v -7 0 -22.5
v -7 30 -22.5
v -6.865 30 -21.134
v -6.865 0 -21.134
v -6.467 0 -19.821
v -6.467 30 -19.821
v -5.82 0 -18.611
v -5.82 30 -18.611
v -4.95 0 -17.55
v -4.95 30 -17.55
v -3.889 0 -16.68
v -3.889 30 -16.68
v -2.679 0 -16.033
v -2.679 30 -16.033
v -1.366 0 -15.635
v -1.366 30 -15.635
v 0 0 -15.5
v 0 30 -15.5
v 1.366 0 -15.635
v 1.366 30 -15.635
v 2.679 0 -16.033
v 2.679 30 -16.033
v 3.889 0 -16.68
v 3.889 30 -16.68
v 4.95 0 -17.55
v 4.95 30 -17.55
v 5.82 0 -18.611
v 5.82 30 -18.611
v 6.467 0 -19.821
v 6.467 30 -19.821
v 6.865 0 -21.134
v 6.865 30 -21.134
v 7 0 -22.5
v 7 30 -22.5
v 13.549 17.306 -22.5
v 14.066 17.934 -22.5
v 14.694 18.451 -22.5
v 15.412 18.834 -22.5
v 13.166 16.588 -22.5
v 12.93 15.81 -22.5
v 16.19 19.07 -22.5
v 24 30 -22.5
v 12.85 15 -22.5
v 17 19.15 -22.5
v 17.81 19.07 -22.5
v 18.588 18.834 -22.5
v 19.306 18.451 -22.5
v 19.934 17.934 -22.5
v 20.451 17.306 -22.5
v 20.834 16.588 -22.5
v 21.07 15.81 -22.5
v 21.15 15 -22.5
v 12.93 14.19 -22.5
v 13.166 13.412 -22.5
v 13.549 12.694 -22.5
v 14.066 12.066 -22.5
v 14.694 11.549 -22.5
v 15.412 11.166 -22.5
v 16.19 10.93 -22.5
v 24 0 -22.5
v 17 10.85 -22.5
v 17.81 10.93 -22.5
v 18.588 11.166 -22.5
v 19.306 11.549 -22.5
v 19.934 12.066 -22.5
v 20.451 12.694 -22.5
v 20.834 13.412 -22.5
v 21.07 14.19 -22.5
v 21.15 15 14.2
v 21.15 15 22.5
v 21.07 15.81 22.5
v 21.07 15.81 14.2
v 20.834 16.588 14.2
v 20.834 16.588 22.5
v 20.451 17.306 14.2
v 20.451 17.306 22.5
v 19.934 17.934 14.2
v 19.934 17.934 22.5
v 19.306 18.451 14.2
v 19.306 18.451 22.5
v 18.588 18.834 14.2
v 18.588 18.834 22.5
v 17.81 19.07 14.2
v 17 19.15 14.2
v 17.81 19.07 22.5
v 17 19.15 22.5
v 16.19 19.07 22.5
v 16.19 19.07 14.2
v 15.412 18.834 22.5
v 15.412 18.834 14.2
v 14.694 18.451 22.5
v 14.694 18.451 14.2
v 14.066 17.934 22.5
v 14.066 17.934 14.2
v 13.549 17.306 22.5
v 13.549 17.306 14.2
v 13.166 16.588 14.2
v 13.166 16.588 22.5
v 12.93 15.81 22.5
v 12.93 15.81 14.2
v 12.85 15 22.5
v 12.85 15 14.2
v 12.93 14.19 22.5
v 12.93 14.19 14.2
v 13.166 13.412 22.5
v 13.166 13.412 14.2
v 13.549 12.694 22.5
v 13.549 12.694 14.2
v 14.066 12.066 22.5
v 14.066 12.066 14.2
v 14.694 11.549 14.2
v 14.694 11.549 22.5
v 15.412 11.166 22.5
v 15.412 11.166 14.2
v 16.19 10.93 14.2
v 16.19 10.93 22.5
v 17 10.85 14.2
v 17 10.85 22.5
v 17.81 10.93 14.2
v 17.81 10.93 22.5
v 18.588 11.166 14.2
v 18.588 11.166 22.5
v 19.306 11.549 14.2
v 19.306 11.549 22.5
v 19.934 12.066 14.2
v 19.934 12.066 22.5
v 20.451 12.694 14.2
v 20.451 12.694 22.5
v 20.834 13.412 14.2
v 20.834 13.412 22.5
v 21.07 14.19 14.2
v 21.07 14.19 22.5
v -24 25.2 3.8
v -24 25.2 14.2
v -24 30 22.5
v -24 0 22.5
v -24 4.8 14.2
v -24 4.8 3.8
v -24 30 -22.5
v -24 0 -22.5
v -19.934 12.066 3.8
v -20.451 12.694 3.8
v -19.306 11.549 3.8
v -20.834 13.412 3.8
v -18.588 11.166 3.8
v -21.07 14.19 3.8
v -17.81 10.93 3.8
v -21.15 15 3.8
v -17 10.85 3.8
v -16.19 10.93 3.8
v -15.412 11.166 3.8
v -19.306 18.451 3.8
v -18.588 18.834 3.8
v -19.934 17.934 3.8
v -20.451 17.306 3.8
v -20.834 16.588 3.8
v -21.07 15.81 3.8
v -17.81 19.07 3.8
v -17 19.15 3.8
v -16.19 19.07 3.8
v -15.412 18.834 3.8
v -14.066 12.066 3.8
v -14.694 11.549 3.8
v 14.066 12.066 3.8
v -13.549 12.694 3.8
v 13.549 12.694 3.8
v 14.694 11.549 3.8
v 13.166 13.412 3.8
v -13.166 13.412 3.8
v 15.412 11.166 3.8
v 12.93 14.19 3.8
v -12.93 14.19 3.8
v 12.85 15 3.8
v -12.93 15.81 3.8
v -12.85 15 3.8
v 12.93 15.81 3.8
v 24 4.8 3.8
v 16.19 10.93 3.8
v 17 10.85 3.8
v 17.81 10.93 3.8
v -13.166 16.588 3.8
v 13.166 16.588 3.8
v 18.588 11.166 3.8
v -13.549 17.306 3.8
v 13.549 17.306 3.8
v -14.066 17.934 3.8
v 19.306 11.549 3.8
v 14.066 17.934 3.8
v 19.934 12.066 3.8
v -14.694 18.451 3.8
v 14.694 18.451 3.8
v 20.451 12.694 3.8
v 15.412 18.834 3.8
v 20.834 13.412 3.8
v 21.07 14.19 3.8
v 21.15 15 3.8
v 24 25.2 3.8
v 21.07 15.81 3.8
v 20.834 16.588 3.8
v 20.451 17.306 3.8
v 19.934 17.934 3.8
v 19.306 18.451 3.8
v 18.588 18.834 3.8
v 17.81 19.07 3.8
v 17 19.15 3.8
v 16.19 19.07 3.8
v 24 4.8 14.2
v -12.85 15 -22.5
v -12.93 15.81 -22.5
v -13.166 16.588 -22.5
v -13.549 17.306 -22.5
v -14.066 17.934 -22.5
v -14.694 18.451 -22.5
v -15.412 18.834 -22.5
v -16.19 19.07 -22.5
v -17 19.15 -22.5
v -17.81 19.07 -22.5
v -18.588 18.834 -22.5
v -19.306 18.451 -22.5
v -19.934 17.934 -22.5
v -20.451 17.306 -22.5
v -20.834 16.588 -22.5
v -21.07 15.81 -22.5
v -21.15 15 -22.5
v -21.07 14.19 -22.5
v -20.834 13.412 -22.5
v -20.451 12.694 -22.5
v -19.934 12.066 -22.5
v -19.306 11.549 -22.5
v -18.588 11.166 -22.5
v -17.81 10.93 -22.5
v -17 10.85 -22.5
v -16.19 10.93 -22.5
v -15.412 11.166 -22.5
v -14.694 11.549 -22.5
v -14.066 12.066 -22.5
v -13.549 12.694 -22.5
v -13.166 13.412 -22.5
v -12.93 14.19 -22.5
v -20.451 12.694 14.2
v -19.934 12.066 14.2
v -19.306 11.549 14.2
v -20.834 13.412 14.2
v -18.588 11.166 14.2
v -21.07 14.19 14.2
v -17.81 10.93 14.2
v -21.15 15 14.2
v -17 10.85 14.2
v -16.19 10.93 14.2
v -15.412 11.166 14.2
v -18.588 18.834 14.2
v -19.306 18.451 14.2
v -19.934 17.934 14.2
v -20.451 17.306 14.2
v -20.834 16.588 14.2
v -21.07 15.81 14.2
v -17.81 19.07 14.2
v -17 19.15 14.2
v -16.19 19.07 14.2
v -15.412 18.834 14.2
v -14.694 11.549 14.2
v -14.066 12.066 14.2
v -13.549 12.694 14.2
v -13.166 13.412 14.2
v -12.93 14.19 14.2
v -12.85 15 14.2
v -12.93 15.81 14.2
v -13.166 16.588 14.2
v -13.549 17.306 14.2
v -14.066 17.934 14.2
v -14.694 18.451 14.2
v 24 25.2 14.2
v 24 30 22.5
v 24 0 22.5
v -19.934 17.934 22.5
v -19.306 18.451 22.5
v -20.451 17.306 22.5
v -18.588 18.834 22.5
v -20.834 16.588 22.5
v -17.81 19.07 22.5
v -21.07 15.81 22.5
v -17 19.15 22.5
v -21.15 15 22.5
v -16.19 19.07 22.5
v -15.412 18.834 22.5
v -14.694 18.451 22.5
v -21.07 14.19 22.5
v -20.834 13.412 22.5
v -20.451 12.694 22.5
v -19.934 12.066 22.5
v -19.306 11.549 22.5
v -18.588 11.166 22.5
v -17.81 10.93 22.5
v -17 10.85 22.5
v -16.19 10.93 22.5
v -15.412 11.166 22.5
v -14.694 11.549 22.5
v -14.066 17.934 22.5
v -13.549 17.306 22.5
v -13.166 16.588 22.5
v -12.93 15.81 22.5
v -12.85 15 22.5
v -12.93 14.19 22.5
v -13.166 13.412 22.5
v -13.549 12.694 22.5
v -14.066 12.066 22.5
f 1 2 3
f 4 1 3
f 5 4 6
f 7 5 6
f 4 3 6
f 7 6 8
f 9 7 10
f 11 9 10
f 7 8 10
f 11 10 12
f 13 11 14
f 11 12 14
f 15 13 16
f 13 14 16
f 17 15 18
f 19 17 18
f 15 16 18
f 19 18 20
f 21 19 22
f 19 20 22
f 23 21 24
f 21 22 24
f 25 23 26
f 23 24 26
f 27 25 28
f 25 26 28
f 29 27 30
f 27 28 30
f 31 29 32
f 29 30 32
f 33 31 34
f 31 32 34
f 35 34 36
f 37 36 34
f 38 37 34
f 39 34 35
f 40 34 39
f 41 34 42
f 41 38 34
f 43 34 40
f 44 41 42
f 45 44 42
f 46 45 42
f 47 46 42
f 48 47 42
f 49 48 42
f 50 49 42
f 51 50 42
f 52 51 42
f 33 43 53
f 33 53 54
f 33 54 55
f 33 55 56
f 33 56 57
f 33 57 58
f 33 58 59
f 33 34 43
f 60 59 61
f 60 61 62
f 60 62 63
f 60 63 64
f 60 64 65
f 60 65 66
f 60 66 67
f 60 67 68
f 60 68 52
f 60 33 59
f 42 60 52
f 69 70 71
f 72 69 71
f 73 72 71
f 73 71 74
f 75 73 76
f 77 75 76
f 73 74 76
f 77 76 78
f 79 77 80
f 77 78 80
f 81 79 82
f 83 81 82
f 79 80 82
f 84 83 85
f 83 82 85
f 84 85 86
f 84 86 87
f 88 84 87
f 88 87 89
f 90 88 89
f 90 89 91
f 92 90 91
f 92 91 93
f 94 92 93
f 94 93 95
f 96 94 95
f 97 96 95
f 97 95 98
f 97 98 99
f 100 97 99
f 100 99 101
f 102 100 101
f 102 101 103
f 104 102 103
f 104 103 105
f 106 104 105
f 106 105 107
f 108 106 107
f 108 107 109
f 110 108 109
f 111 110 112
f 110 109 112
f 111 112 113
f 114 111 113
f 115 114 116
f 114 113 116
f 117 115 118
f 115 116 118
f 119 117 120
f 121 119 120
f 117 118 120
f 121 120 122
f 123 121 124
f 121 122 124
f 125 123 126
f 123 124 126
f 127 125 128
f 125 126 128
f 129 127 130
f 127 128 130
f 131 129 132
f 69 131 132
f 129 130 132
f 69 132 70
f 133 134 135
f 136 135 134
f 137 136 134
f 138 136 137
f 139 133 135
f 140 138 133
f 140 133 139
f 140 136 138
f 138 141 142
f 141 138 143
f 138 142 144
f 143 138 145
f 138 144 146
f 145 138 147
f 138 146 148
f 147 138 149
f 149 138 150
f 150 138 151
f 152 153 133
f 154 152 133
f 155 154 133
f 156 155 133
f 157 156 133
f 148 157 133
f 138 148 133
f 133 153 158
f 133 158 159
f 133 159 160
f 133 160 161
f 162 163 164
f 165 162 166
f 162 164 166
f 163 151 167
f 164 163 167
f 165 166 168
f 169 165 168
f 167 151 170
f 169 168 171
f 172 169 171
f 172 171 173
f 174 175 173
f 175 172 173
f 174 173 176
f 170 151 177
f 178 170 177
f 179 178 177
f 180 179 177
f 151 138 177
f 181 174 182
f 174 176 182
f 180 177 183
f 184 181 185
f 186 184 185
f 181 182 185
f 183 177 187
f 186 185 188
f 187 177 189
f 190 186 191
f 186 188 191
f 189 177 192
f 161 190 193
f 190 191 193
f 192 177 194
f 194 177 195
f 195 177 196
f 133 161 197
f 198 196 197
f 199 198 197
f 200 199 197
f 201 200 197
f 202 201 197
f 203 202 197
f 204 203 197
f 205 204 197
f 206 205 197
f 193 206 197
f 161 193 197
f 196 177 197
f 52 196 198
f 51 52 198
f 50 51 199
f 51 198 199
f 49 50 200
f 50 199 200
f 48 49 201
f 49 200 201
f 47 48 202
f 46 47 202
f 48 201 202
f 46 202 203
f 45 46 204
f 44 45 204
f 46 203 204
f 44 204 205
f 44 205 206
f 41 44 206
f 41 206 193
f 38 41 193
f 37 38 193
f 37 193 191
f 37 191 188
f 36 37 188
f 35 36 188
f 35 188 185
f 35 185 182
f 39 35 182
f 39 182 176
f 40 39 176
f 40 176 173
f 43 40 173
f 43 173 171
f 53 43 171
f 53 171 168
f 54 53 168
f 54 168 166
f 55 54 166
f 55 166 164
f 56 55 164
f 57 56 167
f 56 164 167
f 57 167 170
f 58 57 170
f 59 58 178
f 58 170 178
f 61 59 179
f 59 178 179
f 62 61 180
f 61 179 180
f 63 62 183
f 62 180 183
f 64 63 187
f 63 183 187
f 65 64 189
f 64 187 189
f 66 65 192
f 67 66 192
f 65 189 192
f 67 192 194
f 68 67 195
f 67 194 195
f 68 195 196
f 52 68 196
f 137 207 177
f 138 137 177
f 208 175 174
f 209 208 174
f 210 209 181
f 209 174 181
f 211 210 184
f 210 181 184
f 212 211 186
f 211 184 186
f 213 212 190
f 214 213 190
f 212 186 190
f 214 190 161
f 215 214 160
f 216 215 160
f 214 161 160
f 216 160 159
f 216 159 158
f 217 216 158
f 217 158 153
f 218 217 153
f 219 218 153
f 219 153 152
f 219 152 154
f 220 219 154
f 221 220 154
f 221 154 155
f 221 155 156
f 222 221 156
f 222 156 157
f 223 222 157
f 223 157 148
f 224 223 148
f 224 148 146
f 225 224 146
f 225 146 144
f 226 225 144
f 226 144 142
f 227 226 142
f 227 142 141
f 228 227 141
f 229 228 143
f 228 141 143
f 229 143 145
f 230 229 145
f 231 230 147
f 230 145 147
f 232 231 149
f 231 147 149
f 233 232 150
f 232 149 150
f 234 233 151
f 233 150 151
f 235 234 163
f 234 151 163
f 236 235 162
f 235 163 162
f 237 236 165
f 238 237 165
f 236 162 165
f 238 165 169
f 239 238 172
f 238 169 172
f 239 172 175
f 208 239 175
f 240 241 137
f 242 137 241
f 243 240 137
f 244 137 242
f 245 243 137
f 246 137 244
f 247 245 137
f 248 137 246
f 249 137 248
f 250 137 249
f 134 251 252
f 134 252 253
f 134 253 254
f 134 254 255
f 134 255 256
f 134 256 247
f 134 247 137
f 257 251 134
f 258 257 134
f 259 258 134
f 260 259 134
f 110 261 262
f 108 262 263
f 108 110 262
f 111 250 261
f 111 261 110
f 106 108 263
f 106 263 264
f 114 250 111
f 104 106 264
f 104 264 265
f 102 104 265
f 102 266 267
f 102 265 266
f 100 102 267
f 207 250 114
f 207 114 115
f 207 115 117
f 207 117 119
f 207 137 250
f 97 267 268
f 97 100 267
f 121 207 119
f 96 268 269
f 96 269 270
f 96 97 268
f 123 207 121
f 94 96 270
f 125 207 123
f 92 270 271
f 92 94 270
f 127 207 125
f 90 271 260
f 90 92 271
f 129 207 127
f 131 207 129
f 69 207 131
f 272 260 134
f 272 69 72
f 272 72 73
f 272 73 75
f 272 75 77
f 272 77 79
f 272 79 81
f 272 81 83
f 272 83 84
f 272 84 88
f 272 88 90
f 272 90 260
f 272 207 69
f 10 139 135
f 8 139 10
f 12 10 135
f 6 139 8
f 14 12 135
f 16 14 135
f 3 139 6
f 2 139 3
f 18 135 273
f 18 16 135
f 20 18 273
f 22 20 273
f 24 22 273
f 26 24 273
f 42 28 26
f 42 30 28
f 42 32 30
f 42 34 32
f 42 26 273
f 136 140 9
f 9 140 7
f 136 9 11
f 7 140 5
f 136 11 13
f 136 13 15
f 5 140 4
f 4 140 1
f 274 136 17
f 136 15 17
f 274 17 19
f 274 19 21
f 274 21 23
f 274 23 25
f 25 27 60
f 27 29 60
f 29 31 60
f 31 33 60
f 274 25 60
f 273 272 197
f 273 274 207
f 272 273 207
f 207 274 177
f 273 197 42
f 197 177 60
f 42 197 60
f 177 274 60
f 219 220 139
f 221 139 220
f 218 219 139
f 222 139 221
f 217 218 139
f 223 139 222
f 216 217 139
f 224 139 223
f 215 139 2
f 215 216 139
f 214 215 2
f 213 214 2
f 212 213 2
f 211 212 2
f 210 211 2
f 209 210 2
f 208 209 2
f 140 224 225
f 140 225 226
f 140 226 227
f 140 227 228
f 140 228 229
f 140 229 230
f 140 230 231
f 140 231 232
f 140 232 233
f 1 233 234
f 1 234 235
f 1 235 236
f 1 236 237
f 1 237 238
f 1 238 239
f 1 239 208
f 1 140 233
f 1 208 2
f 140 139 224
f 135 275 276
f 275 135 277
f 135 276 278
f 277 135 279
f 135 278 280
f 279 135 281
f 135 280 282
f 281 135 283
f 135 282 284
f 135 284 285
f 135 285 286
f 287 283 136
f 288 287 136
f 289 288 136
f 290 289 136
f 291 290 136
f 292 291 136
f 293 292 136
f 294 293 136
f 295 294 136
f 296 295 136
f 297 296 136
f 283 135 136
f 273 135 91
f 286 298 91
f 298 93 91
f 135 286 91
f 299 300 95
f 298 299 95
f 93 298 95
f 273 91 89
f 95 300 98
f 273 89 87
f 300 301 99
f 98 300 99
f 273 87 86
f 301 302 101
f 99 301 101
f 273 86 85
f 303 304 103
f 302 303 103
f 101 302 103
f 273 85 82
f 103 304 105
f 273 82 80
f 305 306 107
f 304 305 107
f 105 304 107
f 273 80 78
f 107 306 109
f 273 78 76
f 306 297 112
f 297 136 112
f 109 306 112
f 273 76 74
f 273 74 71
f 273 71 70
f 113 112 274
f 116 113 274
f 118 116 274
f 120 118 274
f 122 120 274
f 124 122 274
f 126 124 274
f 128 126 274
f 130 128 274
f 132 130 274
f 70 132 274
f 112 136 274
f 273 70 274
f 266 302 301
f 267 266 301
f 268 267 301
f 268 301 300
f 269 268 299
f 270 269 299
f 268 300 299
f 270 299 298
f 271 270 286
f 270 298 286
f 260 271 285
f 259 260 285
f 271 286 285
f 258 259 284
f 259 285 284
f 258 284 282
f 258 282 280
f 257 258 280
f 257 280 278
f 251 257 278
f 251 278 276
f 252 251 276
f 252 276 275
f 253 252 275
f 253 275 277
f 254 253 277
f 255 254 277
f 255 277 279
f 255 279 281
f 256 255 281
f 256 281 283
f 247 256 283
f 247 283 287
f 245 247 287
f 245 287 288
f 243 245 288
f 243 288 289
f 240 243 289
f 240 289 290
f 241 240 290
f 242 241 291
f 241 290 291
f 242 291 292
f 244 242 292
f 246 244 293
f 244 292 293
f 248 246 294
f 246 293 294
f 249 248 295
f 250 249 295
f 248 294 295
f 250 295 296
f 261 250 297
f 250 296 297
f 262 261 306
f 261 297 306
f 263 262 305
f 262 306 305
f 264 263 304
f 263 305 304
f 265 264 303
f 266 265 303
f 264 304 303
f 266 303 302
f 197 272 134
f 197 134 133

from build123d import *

# Parameters (mm, degrees)
SKETCH1_W               = 48
SKETCH1_H               = 45
BOSS_EXTRUDE1_DEPTH     = 30
SKETCH2_W               = 10.4
SKETCH2_H               = 20.4
CUT_EXTRUDE1_DEPTH      = 49
SKETCH3_R               = 4.15
CUT_EXTRUDE2_DEPTH      = 46
CUT_EXTRUDE3_DEPTH      = 1
CUT_EXTRUDE3_DEPTH_BACK = 31


with BuildPart() as part:
    # Sketch1 → Boss-Extrude1 (new body)
    with BuildSketch(Plane(origin=(0, 0, 0), x_dir=(1, 0, 0), z_dir=(0, 1, 0))):
        Rectangle(SKETCH1_W, SKETCH1_H)
    extrude(amount=BOSS_EXTRUDE1_DEPTH)

    # Sketch2 → Cut-Extrude1 (cut, through all)
    with BuildSketch(Plane(origin=(24, 0, 0), x_dir=(0, 0, -1), z_dir=(1, 0, 0))):
        with Locations((-9, 15)):
            Rectangle(SKETCH2_W, SKETCH2_H)
    extrude(amount=-CUT_EXTRUDE1_DEPTH, mode=Mode.SUBTRACT)

    # Sketch3 → Cut-Extrude2 (cut, through all)
    with BuildSketch(Plane.XY.offset(22.5)):
        with Locations((-17, 15)):
            Circle(SKETCH3_R)
        with Locations((17, 15)):
            Circle(SKETCH3_R)
    extrude(amount=-CUT_EXTRUDE2_DEPTH, mode=Mode.SUBTRACT)

    # Sketch4 → Cut-Extrude3 (cut, two sides)
    with BuildSketch(Plane(origin=(0, 30, 0), x_dir=(1, 0, 0), z_dir=(0, 1, 0))) as cut_extrude3_sk:
        with BuildLine():
            Line((-7, 141.788608739), (-7, 22.5))
            ThreePointArc((-7, 22.5), (0, 15.5), (7, 22.5))
            Line((7, 22.5), (7, 141.788608739))
            Line((7, 141.788608739), (7, 380.365826216))
            Line((7, 380.365826216), (-7, 380.365826216))
            Line((-7, 380.365826216), (-7, 141.788608739))
        make_face()
    extrude(amount=CUT_EXTRUDE3_DEPTH, mode=Mode.SUBTRACT)
    extrude(cut_extrude3_sk.sketch, amount=-CUT_EXTRUDE3_DEPTH_BACK, mode=Mode.SUBTRACT)


solid = part.part
